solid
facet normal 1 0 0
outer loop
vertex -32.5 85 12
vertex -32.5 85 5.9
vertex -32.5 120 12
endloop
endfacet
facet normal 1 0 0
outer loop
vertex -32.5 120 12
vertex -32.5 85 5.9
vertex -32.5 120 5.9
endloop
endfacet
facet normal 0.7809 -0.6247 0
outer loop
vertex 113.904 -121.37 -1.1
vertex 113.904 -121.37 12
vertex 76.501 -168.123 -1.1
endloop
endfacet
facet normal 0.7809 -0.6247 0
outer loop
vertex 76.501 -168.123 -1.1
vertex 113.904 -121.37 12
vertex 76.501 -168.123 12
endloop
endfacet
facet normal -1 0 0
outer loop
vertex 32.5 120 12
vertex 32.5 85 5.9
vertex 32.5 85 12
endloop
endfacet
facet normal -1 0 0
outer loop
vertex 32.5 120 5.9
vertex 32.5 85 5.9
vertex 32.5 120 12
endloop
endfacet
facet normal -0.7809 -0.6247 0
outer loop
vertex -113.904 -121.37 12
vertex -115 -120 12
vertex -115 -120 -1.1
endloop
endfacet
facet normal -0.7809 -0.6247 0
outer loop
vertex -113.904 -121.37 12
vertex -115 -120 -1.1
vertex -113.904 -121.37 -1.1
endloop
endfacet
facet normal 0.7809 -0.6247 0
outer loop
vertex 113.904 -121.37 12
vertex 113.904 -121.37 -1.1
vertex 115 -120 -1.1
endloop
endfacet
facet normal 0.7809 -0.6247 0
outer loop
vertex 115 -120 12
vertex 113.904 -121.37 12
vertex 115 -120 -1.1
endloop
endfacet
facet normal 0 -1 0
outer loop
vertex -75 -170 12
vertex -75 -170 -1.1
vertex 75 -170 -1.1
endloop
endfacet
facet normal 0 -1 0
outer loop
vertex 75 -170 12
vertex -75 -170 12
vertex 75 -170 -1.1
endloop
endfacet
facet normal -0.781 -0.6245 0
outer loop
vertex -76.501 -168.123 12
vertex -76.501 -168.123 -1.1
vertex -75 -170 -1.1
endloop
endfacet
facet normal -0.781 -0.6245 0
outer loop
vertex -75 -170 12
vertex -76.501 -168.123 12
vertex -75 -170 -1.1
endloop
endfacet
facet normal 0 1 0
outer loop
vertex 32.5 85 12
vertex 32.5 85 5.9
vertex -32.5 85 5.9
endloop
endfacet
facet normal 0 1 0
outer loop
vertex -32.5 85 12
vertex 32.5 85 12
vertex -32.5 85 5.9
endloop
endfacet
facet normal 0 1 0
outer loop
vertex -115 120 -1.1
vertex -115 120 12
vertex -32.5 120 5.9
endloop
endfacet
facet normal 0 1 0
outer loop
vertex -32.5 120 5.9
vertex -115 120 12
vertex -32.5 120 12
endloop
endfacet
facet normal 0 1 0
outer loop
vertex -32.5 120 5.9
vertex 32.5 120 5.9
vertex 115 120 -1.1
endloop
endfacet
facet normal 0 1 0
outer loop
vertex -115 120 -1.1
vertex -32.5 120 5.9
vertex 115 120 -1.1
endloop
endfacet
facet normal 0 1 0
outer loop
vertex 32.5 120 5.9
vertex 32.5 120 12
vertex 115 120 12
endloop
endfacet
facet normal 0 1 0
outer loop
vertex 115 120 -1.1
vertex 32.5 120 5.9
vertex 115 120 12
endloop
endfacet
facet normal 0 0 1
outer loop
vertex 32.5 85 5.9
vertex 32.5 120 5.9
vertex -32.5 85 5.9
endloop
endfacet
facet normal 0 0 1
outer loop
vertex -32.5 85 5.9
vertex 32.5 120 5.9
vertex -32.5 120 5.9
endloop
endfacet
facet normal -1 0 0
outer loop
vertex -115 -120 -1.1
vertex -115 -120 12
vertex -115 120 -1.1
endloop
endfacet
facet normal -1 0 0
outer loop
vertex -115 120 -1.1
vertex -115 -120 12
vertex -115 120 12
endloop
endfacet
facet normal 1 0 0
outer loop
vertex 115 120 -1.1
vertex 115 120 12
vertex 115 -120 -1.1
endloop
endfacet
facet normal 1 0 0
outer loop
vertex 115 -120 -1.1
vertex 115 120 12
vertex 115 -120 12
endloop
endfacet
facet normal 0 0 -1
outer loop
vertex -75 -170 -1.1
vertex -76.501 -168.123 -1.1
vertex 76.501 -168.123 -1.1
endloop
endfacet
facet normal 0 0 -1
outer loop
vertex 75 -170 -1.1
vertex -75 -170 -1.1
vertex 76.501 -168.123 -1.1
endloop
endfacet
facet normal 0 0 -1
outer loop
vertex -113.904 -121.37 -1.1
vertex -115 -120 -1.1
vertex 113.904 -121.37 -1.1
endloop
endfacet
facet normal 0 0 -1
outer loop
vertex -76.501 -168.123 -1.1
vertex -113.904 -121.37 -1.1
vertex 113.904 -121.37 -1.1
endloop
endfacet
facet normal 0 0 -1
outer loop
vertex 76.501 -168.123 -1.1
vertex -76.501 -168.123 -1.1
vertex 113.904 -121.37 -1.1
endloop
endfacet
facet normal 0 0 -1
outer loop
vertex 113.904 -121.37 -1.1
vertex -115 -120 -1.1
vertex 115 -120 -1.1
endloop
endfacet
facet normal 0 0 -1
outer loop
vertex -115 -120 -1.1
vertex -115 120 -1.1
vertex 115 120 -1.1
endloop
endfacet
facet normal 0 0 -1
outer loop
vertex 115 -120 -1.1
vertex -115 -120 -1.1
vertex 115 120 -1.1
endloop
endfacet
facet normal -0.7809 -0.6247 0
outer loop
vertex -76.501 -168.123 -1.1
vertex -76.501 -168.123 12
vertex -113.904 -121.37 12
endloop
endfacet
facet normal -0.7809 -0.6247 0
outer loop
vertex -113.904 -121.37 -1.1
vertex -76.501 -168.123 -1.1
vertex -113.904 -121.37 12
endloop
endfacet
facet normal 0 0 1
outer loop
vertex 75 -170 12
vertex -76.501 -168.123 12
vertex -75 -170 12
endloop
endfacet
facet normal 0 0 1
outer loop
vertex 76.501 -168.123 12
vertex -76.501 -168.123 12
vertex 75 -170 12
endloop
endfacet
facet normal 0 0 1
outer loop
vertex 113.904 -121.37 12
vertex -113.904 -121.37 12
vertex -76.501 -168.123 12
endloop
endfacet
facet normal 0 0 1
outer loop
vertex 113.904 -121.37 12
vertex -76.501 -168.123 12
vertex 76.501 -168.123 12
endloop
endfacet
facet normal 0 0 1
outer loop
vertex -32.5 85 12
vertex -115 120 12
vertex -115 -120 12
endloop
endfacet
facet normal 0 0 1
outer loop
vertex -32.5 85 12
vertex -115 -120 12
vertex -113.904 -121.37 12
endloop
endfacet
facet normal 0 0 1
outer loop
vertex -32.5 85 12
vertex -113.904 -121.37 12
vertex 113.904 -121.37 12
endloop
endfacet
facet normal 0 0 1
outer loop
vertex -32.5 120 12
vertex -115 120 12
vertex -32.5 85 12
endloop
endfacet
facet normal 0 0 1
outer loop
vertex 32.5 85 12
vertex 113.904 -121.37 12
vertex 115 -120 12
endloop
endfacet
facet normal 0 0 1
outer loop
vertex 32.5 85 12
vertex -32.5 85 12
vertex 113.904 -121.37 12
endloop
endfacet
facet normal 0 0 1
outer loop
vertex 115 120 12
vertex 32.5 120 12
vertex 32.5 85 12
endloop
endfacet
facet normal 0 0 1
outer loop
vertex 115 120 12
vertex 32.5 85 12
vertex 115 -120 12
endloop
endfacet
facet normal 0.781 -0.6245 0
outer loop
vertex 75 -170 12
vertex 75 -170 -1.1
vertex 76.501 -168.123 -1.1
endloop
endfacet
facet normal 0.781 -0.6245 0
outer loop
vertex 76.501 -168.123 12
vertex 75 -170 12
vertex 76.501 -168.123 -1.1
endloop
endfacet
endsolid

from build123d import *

# Parameters (mm, degrees)
BOSS_EXTRUDE1_DEPTH   = 13.1
FILLET1_R             = 5
SKETCH2_W             = 65
SKETCH2_H             = 35
CUT_EXTRUDE1_DEPTH    = 206.661396475
SKETCH3_W             = 109.473839025
SKETCH3_H             = 48.944636842
BOSS_EXTRUDE2_DEPTH   = 7
BODY_MOVE_COPY1_ANGLE = 180
DELETEFACE1_START     = -1.1
DELETEFACE1_DEPTH     = 13.1


# Read off the part's stored shape, not the designer's step: DeleteFace1
with BuildPart() as part:
    # Sketch1 → Boss-Extrude1 (new body)
    with BuildSketch(Plane.XY):
        Polygon((115, -120), (115, 120), (-115, 120), (-115, -120), (-75, -170), (75, -170), align=None)
    extrude(amount=BOSS_EXTRUDE1_DEPTH)

    # Fillet1
    fillet1_edges = [part.edges().sort_by_distance(p)[0] for p in [
        (-115, 120, 6.55),
        (115, 120, 6.55),
        (115, -120, 6.55),
        (75, -170, 6.55),
        (-75, -170, 6.55),
        (-115, -120, 6.55),
    ]]
    fillet(fillet1_edges, radius=FILLET1_R)

    # Sketch2 → Cut-Extrude1 (cut, through all)
    with BuildSketch(Plane.XY.offset(13.1)):
        with Locations((0, 102.5)):
            Rectangle(SKETCH2_W, SKETCH2_H)
    extrude(amount=-CUT_EXTRUDE1_DEPTH, mode=Mode.SUBTRACT)

    # Sketch3 → Boss-Extrude2 (add)
    with BuildSketch(Plane.XY.offset(13.1)):
        with Locations((2.558327619, 95.527681579)):
            Rectangle(SKETCH3_W, SKETCH3_H)
    extrude(amount=-BOSS_EXTRUDE2_DEPTH)


with BuildPart() as part_1:
    # Body-Move/Copy1: moved
    add(part.part.rotate(Axis((0, 0, 6), (0, 1, 0)), BODY_MOVE_COPY1_ANGLE))

    # DeleteFace1 outline → DeleteFace1 (add)
    with BuildSketch(Plane.XY.offset(DELETEFACE1_START)):
        with BuildLine():
            ThreePointArc((-72.596875763, -170), (-74.762819415, -169.506516182), (-76.50121981, -168.123475238))
            Line((-76.50121981, -168.123475238), (-75, -170))
            Line((-75, -170), (-72.596875763, -170))
        make_face()
        with BuildLine():
            Line((-115, -120), (-113.904344047, -121.369569941))
            ThreePointArc((-113.904344047, -121.369569941), (-114.718141596, -119.90112941), (-115, -118.246094703))
            Line((-115, -118.246094703), (-115, -120))
        make_face()
        with BuildLine():
            ThreePointArc((76.50121981, -168.123475238), (74.762819415, -169.506516182), (72.596875763, -170))
            Line((72.596875763, -170), (75, -170))
            Line((75, -170), (76.50121981, -168.123475238))
        make_face()
        with BuildLine():
            Line((-115, 120), (-115, 115))
            ThreePointArc((-115, 115), (-113.535533906, 118.535533906), (-110, 120))
            Line((-110, 120), (-115, 120))
        make_face()
        with BuildLine():
            ThreePointArc((115, -118.246094703), (114.718141596, -119.90112941), (113.904344047, -121.369569941))
            Line((113.904344047, -121.369569941), (115, -120))
            Line((115, -120), (115, -118.246094703))
        make_face()
        with BuildLine():
            Line((115, 120), (110, 120))
            ThreePointArc((110, 120), (113.535533906, 118.535533906), (115, 115))
            Line((115, 115), (115, 120))
        make_face()
    extrude(amount=DELETEFACE1_DEPTH)


solid = part_1.part
